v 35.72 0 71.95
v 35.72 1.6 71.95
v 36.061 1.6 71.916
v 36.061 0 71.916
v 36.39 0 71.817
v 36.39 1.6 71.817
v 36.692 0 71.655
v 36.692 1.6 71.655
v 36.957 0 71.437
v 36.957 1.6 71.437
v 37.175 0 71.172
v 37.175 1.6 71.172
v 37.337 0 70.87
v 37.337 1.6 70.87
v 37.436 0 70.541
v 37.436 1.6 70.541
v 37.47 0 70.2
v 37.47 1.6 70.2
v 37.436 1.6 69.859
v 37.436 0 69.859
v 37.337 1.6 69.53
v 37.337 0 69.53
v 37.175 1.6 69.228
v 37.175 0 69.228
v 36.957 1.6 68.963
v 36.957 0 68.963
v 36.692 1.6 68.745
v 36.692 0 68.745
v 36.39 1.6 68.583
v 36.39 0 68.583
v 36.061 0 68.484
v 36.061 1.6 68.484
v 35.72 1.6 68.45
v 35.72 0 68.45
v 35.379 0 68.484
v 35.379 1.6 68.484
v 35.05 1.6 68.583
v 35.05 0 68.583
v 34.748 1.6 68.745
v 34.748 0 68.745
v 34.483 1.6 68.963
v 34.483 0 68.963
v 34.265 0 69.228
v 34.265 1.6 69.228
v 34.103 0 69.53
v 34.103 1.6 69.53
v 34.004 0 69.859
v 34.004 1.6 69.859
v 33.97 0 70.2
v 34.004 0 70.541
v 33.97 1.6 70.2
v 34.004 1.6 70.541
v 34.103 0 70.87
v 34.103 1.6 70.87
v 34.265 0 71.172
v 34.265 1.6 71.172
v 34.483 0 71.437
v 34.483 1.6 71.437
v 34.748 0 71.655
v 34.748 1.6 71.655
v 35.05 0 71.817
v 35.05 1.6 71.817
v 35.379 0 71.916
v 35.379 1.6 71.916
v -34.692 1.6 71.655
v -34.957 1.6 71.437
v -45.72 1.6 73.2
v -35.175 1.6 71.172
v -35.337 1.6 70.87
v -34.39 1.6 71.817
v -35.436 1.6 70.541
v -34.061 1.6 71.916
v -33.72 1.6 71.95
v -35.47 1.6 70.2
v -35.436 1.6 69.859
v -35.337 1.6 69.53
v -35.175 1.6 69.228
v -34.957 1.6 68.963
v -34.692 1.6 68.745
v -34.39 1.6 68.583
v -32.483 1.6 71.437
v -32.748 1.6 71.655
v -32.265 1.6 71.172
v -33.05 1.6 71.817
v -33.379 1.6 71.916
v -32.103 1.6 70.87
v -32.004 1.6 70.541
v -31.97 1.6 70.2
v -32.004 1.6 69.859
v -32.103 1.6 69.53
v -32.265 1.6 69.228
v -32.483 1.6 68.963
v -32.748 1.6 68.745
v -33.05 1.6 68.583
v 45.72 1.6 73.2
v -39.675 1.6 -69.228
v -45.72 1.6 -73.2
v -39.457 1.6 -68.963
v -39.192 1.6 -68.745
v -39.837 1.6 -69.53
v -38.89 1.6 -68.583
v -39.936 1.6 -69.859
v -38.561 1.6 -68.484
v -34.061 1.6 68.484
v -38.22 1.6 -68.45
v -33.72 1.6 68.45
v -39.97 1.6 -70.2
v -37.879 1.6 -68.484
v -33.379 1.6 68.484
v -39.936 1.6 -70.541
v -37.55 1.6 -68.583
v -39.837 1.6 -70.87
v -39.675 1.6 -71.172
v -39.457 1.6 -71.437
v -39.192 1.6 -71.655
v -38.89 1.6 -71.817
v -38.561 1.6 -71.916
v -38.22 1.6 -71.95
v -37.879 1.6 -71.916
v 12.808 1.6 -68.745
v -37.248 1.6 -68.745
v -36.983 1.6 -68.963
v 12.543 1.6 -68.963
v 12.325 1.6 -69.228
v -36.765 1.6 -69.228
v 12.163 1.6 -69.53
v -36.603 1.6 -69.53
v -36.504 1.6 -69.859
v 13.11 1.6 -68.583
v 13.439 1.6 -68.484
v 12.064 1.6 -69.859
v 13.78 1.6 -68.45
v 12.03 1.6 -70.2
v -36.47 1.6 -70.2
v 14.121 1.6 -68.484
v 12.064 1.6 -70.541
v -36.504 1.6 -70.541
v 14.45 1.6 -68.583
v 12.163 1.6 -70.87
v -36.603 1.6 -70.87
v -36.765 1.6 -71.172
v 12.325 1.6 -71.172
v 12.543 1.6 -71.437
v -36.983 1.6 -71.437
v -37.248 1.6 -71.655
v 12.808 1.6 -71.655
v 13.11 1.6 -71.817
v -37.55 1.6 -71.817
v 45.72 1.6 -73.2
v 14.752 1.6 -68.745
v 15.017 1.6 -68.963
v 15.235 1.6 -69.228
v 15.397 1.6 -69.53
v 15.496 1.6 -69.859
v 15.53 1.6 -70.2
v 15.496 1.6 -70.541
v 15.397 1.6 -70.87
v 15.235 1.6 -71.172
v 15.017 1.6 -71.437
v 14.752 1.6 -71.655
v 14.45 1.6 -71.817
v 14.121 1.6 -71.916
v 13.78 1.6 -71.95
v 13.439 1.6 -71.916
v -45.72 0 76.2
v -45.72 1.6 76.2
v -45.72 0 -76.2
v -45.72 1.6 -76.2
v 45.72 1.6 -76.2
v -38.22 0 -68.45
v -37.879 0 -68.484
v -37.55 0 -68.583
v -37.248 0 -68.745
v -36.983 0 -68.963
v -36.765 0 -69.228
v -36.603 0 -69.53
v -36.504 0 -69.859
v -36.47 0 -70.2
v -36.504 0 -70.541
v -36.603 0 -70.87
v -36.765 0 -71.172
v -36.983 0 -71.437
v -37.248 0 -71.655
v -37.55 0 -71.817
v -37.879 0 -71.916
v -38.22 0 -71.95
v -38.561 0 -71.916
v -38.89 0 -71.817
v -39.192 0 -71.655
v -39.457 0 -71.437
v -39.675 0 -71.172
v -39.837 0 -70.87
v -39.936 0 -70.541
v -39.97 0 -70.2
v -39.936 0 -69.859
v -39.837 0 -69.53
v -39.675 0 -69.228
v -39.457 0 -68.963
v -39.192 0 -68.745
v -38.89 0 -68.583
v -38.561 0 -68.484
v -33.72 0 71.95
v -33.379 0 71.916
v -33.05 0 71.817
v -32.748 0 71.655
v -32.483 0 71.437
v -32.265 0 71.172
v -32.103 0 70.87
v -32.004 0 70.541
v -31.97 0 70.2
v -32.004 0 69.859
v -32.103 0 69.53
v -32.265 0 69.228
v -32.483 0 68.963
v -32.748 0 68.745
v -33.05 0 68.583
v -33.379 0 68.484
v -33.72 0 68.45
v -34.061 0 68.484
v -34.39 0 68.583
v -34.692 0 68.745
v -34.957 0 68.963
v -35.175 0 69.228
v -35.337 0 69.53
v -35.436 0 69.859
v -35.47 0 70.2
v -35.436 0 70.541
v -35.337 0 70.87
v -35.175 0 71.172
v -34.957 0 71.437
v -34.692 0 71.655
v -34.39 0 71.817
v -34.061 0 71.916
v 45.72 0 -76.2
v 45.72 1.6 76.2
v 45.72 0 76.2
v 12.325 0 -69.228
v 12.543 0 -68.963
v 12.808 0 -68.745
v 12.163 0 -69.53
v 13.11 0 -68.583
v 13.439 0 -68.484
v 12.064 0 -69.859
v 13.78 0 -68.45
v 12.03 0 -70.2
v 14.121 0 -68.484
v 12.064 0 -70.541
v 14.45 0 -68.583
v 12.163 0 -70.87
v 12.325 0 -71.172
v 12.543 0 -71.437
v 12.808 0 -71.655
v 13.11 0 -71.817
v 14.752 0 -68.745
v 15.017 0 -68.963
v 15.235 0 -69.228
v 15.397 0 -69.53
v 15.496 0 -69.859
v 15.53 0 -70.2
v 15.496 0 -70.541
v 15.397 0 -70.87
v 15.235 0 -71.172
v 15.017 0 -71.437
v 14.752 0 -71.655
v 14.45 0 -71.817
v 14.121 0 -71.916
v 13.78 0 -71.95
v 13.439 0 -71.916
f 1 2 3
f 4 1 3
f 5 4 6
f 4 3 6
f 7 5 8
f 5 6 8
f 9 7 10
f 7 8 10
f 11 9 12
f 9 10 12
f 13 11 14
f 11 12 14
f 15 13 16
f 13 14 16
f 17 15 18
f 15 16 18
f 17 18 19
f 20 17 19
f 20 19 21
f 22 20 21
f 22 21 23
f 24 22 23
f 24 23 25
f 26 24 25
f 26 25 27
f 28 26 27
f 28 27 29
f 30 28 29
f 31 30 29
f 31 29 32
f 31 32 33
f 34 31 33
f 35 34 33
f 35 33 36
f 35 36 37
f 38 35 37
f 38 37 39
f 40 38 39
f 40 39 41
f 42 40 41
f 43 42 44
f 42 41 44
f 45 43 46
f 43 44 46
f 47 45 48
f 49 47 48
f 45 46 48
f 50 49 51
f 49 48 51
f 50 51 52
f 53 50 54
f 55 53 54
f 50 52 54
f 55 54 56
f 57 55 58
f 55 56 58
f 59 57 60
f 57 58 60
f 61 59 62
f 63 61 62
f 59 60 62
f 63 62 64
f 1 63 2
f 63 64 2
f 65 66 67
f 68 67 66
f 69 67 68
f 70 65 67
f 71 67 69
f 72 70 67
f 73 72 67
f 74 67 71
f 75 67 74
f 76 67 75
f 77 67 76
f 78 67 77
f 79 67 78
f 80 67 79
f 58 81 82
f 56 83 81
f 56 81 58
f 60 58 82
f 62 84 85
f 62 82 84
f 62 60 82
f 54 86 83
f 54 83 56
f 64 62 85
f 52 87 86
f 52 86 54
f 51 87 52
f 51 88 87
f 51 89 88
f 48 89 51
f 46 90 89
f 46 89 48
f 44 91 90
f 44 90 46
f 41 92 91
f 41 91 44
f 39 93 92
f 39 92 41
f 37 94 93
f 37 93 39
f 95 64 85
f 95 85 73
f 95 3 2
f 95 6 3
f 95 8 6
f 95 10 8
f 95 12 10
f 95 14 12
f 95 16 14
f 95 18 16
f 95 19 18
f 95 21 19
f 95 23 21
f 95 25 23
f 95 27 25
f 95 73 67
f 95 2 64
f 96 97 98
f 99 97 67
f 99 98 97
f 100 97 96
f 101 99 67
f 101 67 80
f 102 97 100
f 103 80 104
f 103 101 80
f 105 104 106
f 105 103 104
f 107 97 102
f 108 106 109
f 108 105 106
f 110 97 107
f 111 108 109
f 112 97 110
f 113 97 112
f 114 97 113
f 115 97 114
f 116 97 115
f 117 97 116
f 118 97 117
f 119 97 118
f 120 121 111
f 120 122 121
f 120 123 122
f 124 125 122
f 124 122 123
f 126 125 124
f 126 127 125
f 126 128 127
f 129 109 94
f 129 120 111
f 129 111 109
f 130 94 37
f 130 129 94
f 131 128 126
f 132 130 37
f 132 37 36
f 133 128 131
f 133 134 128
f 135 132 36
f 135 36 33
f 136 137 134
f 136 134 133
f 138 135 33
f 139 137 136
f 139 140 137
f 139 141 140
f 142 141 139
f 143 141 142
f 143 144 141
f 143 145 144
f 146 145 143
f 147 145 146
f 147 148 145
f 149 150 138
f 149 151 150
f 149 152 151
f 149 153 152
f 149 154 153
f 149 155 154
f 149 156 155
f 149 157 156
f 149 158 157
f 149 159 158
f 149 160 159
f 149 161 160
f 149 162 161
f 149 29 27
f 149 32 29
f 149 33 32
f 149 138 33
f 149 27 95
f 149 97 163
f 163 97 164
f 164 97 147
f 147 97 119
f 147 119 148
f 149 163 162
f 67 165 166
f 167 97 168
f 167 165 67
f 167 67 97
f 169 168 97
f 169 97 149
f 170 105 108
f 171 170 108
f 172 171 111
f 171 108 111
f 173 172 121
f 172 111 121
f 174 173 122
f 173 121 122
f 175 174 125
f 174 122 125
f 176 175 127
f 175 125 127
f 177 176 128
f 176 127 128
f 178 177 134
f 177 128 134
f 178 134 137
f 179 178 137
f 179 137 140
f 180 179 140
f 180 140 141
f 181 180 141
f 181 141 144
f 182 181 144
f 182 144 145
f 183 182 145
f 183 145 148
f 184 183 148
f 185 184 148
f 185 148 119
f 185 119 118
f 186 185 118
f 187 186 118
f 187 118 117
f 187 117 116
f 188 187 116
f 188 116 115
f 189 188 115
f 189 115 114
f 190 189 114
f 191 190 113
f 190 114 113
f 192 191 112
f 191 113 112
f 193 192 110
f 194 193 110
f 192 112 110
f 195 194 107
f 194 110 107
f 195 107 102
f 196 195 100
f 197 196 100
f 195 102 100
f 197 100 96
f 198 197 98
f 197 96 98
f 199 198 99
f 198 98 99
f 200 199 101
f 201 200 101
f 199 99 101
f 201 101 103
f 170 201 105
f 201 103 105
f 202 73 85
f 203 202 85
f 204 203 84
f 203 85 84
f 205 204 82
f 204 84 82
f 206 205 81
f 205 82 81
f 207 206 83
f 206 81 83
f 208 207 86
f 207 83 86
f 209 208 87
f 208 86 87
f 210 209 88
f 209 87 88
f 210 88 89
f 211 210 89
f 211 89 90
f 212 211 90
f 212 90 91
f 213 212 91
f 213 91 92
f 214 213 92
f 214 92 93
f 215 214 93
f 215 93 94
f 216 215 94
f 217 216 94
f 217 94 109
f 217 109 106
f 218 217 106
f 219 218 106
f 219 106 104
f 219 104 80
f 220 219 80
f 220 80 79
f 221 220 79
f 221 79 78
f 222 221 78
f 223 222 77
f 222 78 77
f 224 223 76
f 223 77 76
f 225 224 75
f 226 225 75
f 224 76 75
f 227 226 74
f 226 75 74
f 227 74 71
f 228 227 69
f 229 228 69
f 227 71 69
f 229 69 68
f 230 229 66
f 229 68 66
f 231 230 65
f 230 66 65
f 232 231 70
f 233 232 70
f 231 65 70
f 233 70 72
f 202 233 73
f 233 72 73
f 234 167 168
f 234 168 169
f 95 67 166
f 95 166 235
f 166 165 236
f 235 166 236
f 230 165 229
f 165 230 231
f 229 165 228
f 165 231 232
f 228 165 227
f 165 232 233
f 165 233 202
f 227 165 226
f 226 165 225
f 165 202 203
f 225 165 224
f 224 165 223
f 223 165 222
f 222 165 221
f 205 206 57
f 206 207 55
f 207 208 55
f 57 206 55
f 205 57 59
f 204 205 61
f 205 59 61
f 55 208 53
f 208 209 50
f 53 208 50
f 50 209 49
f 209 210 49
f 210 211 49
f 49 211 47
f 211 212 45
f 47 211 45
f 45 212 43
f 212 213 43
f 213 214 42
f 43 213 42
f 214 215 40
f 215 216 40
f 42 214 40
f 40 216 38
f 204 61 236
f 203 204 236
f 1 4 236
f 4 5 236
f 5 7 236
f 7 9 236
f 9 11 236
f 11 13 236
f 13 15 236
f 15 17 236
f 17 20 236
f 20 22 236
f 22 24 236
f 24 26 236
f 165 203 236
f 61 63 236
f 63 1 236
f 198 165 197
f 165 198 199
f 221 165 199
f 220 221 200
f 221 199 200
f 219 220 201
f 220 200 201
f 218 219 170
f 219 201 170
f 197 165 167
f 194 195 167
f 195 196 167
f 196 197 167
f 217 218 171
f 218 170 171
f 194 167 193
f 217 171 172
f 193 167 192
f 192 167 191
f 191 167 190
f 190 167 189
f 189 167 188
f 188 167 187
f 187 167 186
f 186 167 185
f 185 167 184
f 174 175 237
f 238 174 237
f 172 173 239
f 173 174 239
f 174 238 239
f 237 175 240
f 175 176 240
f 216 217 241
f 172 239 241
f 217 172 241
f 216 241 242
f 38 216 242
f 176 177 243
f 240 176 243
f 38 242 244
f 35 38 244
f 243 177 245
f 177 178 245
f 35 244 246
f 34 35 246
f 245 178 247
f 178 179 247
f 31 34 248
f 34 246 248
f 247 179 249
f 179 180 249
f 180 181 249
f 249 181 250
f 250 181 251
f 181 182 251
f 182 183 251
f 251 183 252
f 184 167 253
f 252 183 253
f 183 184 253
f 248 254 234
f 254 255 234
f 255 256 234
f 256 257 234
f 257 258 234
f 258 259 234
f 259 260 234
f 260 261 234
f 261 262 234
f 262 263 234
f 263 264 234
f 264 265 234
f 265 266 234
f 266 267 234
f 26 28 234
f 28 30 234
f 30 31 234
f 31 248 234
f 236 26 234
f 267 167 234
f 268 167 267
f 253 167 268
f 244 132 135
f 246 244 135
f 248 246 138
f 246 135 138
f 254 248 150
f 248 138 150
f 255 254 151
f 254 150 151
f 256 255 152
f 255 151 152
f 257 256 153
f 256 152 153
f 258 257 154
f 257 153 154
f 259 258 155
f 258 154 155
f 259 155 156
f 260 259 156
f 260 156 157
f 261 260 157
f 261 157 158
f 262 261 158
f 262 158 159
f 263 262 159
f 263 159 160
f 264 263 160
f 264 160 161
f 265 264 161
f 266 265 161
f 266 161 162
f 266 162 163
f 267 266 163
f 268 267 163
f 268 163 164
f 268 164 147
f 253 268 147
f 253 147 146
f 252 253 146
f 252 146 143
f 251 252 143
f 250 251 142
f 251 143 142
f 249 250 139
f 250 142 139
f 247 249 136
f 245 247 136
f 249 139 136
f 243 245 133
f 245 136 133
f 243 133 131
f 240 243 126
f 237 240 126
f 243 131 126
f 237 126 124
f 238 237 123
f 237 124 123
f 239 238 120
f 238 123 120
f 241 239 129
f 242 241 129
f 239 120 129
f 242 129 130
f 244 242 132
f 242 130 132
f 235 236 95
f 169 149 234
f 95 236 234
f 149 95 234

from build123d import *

# Parameters (mm, degrees)
SKETCH1_W           = 91.44
SKETCH1_H           = 152.4
BOSS_EXTRUDE1_DEPTH = 1.6
CUT_EXTRUDE1_REACH  = 90.878
SKETCH2_R           = 1.75
SKETCH3_W           = 91.44
SKETCH3_H           = 3
CUT_EXTRUDE2_DEPTH  = 0.0001


with BuildPart() as part:
    # Sketch1 → Boss-Extrude1 (new body)
    with BuildSketch(Plane(origin=(0, 0, 0), x_dir=(1, 0, 0), z_dir=(0, 1, 0))):
        Rectangle(SKETCH1_W, SKETCH1_H)
    extrude(amount=BOSS_EXTRUDE1_DEPTH)

    # Sketch2 → Cut-Extrude1 (cut, up to next)
    with BuildSketch(Plane(origin=(0, 1.6, 0), x_dir=(1, 0, 0), z_dir=(0, 1, 0)), mode=Mode.PRIVATE) as cut_extrude1_sk1:
        with Locations(Location((-38.22, 70.2, 0), (0, 0, 270))):
            Circle(SKETCH2_R)
    cut_extrude1_tool1 = extrude(cut_extrude1_sk1.sketch, amount=-CUT_EXTRUDE1_REACH, mode=Mode.PRIVATE) & part.part
    # Sketch2 → Cut-Extrude1 (cut, up to next)
    with BuildSketch(Plane(origin=(0, 1.6, 0), x_dir=(1, 0, 0), z_dir=(0, 1, 0)), mode=Mode.PRIVATE) as cut_extrude1_sk2:
        with Locations(Location((-33.72, -70.2, 0), (0, 0, 270))):
            Circle(SKETCH2_R)
    cut_extrude1_tool2 = extrude(cut_extrude1_sk2.sketch, amount=-CUT_EXTRUDE1_REACH, mode=Mode.PRIVATE) & part.part
    # Sketch2 → Cut-Extrude1 (cut, up to next)
    with BuildSketch(Plane(origin=(0, 1.6, 0), x_dir=(1, 0, 0), z_dir=(0, 1, 0)), mode=Mode.PRIVATE) as cut_extrude1_sk3:
        with Locations(Location((35.72, -70.2, 0), (0, 0, 270))):
            Circle(SKETCH2_R)
    cut_extrude1_tool3 = extrude(cut_extrude1_sk3.sketch, amount=-CUT_EXTRUDE1_REACH, mode=Mode.PRIVATE) & part.part
    # Sketch2 → Cut-Extrude1 (cut, up to next)
    with BuildSketch(Plane(origin=(0, 1.6, 0), x_dir=(1, 0, 0), z_dir=(0, 1, 0)), mode=Mode.PRIVATE) as cut_extrude1_sk4:
        with Locations(Location((13.78, 70.2, 0), (0, 0, 270))):
            Circle(SKETCH2_R)
    cut_extrude1_tool4 = extrude(cut_extrude1_sk4.sketch, amount=-CUT_EXTRUDE1_REACH, mode=Mode.PRIVATE) & part.part
    add(cut_extrude1_tool1.solids().sort_by_distance((-38.22, 1.6, -70.2))[0], mode=Mode.SUBTRACT)
    add(cut_extrude1_tool2.solids().sort_by_distance((-33.72, 1.6, 70.2))[0], mode=Mode.SUBTRACT)
    add(cut_extrude1_tool3.solids().sort_by_distance((35.72, 1.6, 70.2))[0], mode=Mode.SUBTRACT)
    add(cut_extrude1_tool4.solids().sort_by_distance((13.78, 1.6, -70.2))[0], mode=Mode.SUBTRACT)

    # Sketch3 → Cut-Extrude2 (cut)
    with BuildSketch(Plane(origin=(0, 1.6, 0), x_dir=(1, 0, 0), z_dir=(0, 1, 0))):
        with Locations((0, 74.7)):
            Rectangle(SKETCH3_W, SKETCH3_H)
        with Locations((0, -74.7)):
            Rectangle(SKETCH3_W, SKETCH3_H)
    extrude(amount=-CUT_EXTRUDE2_DEPTH, mode=Mode.SUBTRACT)


solid = part.part
